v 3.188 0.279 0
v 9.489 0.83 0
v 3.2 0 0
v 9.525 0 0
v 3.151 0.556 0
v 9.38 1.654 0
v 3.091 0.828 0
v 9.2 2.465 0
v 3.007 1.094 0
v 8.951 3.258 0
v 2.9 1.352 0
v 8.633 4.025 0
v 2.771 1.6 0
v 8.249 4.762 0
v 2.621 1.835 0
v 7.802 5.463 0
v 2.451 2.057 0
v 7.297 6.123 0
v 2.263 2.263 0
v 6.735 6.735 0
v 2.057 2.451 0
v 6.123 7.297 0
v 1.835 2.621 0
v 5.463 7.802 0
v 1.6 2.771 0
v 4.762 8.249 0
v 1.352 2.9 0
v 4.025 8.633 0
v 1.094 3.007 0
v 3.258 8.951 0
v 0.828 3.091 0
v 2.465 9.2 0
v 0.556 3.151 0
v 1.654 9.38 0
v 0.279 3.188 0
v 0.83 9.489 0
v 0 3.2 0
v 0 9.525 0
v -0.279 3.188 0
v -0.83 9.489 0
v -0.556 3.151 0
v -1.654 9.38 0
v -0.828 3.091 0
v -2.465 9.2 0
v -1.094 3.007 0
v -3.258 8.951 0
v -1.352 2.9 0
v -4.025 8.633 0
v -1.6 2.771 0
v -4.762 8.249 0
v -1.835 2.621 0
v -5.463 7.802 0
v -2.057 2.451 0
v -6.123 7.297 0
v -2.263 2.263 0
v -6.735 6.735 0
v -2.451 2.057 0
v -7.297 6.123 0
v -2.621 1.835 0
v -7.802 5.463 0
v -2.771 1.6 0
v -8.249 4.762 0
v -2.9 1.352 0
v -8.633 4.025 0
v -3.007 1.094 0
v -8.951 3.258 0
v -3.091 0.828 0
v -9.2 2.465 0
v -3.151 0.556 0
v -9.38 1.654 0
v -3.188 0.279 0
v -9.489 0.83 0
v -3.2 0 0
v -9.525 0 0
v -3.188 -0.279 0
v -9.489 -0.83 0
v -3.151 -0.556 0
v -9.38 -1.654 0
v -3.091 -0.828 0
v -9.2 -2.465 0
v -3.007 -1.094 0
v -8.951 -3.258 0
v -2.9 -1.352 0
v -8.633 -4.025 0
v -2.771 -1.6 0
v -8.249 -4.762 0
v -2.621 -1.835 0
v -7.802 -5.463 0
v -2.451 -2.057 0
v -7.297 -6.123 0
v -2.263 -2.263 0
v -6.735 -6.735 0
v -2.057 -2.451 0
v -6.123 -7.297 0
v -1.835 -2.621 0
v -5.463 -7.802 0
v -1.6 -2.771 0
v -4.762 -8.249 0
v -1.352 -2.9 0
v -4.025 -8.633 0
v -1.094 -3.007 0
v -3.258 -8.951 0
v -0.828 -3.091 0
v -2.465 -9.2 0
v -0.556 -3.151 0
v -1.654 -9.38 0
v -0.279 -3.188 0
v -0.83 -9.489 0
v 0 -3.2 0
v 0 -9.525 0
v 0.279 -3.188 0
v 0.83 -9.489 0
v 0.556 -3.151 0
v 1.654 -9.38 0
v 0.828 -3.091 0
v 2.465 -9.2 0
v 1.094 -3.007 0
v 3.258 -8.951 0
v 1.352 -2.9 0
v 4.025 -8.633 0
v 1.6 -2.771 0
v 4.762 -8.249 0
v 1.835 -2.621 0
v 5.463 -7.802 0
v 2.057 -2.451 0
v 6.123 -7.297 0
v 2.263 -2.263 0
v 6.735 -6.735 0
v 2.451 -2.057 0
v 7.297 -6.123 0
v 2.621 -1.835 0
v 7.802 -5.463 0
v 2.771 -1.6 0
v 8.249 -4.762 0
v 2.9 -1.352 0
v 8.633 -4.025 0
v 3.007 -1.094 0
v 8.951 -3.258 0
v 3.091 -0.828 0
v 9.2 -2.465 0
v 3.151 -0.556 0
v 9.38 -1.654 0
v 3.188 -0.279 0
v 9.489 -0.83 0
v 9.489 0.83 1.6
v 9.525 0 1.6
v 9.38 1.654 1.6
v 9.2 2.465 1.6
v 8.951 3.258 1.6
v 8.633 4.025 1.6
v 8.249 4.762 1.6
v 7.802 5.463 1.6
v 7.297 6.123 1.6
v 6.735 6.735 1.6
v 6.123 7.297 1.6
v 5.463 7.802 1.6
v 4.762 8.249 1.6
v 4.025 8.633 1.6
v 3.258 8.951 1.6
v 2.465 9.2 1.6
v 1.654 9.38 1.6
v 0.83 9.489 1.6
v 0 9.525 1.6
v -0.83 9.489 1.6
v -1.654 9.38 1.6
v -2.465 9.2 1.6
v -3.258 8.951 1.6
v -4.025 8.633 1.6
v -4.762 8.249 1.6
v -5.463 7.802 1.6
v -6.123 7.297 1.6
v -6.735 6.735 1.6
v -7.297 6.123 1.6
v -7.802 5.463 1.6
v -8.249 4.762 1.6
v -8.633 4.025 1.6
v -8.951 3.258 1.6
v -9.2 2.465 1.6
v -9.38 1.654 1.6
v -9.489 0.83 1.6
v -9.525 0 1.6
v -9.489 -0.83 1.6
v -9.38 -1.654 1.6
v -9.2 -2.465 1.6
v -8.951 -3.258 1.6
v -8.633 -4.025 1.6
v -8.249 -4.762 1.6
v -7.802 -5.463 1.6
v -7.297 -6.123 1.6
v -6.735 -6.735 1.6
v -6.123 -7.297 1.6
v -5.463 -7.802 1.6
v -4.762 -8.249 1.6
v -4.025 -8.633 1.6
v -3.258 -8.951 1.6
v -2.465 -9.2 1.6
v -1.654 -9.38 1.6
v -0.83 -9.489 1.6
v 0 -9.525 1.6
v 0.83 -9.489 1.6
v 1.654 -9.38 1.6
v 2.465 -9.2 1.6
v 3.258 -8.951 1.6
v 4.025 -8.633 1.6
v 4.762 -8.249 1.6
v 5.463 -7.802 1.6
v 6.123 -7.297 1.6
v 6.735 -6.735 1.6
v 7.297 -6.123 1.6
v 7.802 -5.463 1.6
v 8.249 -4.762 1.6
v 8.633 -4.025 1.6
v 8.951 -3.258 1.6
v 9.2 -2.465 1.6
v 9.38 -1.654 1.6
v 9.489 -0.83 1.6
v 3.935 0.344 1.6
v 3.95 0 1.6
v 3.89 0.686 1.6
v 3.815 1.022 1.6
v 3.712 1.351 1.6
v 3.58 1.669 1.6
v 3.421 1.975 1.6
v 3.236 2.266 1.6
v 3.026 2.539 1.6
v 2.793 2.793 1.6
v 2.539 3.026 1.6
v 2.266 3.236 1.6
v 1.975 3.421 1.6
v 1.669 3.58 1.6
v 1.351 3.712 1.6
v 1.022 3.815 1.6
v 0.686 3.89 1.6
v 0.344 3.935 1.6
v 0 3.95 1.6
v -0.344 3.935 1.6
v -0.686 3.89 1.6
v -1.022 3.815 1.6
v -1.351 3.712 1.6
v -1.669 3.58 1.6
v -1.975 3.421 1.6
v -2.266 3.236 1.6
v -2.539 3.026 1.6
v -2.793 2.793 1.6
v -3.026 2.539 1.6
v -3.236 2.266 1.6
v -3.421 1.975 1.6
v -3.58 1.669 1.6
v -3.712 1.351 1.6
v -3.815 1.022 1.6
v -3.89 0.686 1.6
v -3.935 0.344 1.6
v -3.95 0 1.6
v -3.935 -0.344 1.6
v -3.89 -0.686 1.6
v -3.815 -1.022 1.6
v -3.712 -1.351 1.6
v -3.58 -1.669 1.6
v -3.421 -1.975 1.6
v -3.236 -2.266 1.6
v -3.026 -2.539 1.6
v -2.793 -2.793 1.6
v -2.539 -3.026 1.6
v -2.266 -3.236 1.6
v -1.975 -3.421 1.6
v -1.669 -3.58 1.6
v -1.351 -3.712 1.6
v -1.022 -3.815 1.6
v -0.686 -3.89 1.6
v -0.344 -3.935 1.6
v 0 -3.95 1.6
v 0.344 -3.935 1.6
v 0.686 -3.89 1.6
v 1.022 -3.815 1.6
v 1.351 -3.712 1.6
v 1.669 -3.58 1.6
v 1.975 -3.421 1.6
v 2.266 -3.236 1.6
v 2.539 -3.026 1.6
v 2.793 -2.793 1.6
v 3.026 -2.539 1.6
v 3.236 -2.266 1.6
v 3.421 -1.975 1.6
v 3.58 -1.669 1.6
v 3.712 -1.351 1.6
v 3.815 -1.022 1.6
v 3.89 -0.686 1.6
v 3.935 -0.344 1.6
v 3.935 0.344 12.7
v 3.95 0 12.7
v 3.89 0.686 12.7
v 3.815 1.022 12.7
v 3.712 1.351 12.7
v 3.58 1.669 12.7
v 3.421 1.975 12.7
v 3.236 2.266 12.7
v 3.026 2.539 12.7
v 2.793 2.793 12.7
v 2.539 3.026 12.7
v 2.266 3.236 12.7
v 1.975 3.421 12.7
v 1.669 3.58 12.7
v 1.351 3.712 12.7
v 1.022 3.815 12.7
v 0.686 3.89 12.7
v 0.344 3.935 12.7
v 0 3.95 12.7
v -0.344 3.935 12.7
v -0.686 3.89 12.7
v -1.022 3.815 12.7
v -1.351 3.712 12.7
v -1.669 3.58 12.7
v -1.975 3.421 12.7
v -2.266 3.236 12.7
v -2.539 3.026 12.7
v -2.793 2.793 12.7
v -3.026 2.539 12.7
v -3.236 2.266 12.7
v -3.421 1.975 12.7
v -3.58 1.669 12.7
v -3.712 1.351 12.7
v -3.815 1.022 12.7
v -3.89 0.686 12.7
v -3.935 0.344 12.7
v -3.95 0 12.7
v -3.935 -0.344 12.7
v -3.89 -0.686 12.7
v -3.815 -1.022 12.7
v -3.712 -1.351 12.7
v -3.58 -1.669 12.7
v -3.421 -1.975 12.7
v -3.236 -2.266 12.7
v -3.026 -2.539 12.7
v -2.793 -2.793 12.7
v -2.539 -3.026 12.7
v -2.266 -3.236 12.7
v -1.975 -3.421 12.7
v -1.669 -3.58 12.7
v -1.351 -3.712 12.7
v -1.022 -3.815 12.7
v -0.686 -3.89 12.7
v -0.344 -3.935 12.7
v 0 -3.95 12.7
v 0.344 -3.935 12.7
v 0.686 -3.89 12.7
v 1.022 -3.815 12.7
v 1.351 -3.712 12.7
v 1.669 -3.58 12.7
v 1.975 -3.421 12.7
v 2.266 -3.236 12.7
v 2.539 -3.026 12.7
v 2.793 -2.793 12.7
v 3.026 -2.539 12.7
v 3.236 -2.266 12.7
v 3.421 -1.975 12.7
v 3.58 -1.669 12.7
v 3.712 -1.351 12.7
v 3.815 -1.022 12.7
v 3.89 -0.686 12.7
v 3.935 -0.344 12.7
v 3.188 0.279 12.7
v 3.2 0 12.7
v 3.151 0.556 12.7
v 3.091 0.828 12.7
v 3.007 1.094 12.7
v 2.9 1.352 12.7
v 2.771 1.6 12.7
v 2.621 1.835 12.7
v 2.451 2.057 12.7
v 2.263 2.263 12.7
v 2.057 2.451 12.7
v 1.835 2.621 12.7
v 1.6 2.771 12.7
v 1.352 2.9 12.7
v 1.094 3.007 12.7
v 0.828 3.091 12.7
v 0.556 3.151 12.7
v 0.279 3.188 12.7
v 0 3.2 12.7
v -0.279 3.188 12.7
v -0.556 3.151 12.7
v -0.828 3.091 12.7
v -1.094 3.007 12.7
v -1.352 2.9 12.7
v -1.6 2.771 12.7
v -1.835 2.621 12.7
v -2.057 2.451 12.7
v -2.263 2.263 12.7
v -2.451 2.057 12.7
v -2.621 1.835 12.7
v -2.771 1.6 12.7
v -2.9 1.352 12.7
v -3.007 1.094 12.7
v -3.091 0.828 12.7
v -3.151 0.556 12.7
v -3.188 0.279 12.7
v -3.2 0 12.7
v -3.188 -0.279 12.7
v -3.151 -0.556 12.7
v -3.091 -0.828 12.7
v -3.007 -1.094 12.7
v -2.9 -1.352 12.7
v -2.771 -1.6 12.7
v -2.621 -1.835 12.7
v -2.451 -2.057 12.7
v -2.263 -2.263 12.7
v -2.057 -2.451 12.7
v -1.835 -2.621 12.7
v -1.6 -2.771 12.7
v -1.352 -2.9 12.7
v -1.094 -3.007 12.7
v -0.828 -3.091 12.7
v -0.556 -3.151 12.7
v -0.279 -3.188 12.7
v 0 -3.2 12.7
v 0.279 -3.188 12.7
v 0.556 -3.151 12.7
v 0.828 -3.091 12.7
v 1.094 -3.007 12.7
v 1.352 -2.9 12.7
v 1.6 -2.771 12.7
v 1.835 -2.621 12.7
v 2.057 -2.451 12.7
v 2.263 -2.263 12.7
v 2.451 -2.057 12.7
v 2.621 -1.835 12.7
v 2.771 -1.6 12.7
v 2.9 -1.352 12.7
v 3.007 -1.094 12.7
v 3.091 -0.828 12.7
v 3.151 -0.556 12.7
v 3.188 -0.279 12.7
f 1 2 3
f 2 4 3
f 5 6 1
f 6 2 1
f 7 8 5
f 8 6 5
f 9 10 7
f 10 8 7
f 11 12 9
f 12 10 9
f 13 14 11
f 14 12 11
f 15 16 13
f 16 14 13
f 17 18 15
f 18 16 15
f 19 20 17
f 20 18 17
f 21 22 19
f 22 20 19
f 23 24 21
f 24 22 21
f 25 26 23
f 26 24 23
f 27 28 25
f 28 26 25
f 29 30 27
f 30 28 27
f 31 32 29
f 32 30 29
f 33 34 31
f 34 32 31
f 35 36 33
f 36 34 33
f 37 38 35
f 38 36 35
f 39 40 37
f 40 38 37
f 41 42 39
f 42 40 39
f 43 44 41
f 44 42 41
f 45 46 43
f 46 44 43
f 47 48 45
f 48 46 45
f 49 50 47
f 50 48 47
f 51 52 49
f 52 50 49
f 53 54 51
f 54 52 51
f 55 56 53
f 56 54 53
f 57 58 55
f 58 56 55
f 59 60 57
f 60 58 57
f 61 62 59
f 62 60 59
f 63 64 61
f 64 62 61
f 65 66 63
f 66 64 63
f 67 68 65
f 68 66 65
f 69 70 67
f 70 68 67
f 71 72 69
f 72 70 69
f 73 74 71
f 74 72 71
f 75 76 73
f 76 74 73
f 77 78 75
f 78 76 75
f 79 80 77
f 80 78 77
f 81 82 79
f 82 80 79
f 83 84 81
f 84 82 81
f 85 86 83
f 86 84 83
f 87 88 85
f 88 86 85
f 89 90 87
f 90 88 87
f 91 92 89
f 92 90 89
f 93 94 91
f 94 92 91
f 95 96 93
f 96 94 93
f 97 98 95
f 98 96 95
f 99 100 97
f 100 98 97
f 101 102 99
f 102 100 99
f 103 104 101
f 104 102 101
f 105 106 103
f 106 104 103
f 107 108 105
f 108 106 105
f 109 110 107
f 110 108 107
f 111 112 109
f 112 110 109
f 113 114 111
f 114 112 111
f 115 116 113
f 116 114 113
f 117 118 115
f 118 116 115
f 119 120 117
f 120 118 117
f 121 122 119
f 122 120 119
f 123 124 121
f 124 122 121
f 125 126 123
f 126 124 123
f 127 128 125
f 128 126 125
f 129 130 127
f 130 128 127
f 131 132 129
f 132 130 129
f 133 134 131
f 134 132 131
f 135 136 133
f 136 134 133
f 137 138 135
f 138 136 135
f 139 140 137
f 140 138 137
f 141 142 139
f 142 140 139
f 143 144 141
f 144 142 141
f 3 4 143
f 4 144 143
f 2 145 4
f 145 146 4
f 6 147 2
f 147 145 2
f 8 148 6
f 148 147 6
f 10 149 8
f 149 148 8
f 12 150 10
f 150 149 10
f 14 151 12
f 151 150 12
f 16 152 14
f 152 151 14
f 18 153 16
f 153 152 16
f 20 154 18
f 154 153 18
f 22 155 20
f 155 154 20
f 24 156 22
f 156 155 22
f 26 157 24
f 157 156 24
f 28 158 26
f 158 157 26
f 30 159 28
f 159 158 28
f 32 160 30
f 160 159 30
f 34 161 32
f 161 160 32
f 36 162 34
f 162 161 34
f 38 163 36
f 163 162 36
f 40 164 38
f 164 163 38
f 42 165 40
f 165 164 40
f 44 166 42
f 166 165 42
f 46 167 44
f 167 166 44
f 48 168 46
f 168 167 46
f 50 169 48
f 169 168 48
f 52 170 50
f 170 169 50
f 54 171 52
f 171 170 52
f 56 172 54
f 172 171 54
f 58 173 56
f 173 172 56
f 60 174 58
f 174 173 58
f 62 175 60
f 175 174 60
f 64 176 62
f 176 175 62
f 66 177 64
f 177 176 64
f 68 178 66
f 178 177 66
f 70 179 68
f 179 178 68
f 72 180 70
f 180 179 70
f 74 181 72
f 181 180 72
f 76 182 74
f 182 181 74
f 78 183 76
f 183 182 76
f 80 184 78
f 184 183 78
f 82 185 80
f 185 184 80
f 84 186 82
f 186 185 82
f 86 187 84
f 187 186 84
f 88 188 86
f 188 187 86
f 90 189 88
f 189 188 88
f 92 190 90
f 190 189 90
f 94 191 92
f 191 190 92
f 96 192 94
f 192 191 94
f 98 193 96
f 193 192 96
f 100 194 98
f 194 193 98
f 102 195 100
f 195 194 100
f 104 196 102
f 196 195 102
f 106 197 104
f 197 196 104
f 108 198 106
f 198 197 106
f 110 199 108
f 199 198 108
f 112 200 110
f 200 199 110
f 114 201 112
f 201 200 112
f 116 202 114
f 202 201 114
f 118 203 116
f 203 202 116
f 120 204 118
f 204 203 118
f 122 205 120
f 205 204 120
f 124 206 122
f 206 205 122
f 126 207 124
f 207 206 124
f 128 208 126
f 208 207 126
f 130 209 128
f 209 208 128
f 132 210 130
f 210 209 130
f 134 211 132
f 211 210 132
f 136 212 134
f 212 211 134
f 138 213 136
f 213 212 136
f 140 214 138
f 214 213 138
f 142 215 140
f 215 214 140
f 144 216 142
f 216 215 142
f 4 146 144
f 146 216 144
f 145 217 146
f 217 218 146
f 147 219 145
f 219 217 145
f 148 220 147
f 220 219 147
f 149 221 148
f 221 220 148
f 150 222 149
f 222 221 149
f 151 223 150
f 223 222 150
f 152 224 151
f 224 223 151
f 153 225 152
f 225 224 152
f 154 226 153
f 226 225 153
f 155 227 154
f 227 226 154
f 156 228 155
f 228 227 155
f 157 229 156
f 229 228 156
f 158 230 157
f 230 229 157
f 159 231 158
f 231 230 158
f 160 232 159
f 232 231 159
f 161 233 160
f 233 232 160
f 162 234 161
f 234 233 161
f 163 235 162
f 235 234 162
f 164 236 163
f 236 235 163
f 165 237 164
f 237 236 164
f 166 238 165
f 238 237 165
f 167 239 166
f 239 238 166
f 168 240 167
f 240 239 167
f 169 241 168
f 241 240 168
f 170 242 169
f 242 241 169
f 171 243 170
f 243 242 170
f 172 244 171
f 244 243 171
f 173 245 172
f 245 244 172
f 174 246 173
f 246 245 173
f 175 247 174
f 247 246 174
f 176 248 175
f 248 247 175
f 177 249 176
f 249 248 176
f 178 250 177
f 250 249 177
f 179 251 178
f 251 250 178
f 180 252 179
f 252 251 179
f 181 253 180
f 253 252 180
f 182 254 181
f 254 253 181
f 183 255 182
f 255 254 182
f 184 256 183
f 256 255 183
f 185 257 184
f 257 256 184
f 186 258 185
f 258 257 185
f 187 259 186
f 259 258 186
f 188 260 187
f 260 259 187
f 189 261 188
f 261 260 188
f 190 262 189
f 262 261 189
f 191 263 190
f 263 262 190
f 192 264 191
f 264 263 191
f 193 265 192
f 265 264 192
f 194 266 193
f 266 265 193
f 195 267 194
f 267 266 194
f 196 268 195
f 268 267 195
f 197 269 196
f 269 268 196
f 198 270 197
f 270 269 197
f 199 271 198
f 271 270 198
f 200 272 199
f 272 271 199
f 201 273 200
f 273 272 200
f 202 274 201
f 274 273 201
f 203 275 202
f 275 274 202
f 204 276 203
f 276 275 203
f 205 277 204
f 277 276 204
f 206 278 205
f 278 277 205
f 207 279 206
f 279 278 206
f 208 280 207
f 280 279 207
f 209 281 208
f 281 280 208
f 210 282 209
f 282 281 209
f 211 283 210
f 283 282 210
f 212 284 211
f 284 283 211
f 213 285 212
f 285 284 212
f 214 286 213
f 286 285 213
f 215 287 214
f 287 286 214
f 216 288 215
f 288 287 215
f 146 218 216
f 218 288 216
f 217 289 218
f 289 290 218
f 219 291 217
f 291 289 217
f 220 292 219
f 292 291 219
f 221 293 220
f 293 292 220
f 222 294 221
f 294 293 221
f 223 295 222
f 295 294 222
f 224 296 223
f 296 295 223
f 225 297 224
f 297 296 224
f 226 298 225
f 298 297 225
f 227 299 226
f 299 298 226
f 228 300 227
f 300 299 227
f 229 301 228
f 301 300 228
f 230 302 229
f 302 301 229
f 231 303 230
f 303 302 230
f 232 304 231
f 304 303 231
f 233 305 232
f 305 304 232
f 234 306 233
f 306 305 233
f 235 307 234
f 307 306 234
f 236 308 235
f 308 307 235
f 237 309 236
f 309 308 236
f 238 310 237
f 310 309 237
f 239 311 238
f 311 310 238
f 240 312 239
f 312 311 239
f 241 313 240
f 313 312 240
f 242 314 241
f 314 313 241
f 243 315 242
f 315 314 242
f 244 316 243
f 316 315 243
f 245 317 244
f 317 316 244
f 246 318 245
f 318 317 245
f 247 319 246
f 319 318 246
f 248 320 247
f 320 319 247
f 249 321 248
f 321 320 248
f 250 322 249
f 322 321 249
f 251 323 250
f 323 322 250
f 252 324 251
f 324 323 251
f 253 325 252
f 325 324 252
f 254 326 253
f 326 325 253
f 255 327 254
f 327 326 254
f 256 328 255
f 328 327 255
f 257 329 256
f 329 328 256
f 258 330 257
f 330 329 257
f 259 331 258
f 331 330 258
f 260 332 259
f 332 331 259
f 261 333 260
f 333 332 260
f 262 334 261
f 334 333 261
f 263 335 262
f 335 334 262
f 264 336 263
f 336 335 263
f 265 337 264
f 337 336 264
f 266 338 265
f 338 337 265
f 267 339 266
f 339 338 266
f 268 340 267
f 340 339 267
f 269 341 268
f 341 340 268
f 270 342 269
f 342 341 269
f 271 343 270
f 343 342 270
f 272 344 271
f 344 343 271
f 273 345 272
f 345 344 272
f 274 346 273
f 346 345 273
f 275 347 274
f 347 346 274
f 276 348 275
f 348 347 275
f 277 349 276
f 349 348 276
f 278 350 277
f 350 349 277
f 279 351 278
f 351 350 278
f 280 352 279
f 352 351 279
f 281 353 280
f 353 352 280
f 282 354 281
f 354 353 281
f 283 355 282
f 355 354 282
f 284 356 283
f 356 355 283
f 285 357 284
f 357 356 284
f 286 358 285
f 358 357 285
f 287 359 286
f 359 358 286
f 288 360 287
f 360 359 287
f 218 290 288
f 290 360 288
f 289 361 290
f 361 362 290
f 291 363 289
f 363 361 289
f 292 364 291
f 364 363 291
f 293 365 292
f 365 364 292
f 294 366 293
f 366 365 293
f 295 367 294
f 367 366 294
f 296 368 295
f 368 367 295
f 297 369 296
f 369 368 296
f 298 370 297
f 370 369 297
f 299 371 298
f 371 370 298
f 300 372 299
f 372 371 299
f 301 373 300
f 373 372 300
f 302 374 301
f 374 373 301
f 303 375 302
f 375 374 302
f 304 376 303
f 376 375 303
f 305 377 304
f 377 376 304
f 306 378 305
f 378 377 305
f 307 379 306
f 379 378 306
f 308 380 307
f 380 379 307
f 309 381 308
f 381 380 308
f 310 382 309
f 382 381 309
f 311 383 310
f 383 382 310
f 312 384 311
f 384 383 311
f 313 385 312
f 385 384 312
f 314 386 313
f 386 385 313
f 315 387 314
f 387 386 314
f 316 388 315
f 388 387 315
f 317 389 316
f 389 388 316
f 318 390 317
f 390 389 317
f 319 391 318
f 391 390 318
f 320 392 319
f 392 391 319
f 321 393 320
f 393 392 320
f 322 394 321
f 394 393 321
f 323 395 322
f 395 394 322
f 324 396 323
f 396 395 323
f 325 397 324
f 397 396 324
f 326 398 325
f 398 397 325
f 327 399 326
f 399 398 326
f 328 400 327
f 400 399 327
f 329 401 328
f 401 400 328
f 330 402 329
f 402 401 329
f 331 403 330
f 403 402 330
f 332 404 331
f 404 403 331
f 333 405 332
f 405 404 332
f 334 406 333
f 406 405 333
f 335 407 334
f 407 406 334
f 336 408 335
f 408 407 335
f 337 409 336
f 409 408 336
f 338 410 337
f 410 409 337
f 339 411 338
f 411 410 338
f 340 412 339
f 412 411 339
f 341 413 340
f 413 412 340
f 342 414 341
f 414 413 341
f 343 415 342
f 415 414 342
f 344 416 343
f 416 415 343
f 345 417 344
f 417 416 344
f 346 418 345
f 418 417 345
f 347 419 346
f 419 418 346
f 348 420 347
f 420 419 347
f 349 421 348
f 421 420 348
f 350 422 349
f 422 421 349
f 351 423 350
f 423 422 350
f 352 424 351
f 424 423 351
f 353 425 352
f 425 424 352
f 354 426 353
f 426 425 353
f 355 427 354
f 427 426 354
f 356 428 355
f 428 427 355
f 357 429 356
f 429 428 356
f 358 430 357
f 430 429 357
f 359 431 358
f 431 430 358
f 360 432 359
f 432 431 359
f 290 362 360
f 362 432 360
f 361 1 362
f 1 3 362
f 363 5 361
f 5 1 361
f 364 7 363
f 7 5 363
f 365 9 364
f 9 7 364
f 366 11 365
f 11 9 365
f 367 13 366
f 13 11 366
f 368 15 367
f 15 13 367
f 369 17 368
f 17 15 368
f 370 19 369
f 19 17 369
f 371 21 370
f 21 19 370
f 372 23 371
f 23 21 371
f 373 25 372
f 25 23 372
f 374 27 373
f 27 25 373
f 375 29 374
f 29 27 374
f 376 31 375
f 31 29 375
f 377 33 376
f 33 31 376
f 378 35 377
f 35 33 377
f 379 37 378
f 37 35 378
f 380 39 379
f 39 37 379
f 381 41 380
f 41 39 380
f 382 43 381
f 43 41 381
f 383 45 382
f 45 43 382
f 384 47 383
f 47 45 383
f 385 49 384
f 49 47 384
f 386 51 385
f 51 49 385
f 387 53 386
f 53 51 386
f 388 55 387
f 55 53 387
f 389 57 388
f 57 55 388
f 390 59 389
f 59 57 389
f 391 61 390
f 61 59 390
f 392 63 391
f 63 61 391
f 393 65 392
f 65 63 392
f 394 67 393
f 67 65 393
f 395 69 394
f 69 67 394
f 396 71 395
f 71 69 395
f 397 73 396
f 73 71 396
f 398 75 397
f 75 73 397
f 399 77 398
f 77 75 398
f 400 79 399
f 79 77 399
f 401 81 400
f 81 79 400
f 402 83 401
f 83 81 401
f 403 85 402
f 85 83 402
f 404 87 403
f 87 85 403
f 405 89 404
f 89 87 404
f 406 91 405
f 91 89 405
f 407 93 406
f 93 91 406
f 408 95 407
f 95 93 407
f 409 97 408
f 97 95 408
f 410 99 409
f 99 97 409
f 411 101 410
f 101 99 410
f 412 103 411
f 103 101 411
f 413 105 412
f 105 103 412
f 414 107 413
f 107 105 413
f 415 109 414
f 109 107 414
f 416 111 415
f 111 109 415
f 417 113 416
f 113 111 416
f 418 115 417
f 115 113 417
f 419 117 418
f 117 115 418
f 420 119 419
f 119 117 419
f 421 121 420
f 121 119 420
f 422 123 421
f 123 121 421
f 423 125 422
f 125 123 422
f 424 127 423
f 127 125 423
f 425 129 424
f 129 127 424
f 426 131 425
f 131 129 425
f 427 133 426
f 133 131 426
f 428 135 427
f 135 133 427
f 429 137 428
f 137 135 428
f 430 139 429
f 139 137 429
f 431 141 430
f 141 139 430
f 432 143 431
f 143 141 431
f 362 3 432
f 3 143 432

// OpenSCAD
// file: ../lib/TOGMod1Constructors.scad
// TOGMod1Constructors-v1.7
// 
// Functions to construct objects understood by TOGMod1
// 
// v1.1:
// - Add togmod1_make_rounded_rect
// v1.2:
// - togmod1_make_rounded_rect can make ovals
// v1.3:
// - togmod1_circle_points, to just get the points of a circle
// - if pos parameter to circle function has a third element,
//   returned vertexes will include it as the z component;
// v1.3.1
// - Some assertions
// v1.4:
// - Refactor togmod1_rounded_rect_points and togmod1_circle_points
//   to use togmod1__make_nd_vector_adder for adapting to whatever
//   `pos` parameter is.
// v1.5:
// - togmod_rounded_rect_points will not simplify completely rounded sides
//   (where length of side is exactly twice the rounding radius)
//   unless simplify_rounded_sides=true
//   - This makes it more useful for polyhedron generation,
//     where radius varies, but number of points must remain constant.
// v1.6:
// - togmod1_make_rect makes a simple rectangle
// - togmod1_make_rounded_rect will defer to togmod1_make_rect when r=0
// v1.7:
// - togmod1_make_circle will return empty shape (["union"]) when d=0

use <./TOGArrayLib1.scad>

function togmod1__make_nd_vector_adder(origin=[0,0]) =
	let(origin_is_zero = tal1_reduce(true, origin, function(prev,item) prev && item == 0))
	origin_is_zero ? (function(vec) len(vec) >= len(origin) ? vec : tal1_replace_at(origin, 0, vec)) :
	function(vec) [
		for(i=[0:1:max(len(origin),len(vec))-1]) (len(vec) > i ? vec[i] : 0) + (len(origin) > i ? origin[i] : 0),
	];

assert([1,2,3] == togmod1__make_nd_vector_adder()([1,2,3]));
echo(togmod1__make_nd_vector_adder([0,0,3])([1,2]));
assert([1,2,3] == togmod1__make_nd_vector_adder([0,0,3])([1,2]));


function togmod1_make_cuboid(size) =
	assert(is_list(size))
	assert(len(size) >= 3)
	assert(is_num(size[0]))
	assert(is_num(size[1]))
	assert(is_num(size[2]))
	["polyhedron-vf", [
		[-size[0]/2, -size[1]/2, -size[2]/2],
		[+size[0]/2, -size[1]/2, -size[2]/2],
		[-size[0]/2, +size[1]/2, -size[2]/2],
		[+size[0]/2, +size[1]/2, -size[2]/2],
		[-size[0]/2, -size[1]/2, +size[2]/2],
		[+size[0]/2, -size[1]/2, +size[2]/2],
		[-size[0]/2, +size[1]/2, +size[2]/2],
		[+size[0]/2, +size[1]/2, +size[2]/2]
	], [
		[0,1,3,2],[0,4,5,1],[4,6,7,5],[3,7,6,2],[1,5,7,3],[6,4,0,2]
	]];

function togmod1_make_polygon(verts) =
	["polygon-vp", verts, [[for( i=[0:1:len(verts)-1] ) i%len(verts)]]];

function togmod1_rounded_rect_points(size, r, pos=[0,0], simplify_rounded_sides=false) =
	assert(is_list(size))
	assert(len(size) >= 2)
	let(radii = is_list(r) ? r : is_num(r) ? [r,r] : assert(false, "rounded_rect r(adius) should be list<num> or num"))
	let(rx = radii[0])
	let(ry = radii[1])
	assert(is_num(rx))
	assert(is_num(ry))
	assert(size[0] >= 2*rx, str("size[0] must be >= 2*r[0]; size[0] = ",size[0],", 2*r[0] = ",2*rx))
	assert(size[1] >= 2*ry, str("size[1] must be >= 2*r[1]; size[1] = ",size[1],", 2*r[1] = ",2*ry))
	let(quarterfn=max($fn/4, 1))
	let(qfnx = simplify_rounded_sides && size[0] == 2*rx ? quarterfn-1 : quarterfn)
	let(qfny = simplify_rounded_sides && size[1] == 2*ry ? quarterfn-1 : quarterfn)
	let(finalizepos = togmod1__make_nd_vector_adder(pos))
[
	for(a=[0 : 1 : qfnx]) let(ang=      a*90/quarterfn) finalizepos([ size[0]/2-rx + rx*cos(ang),  size[1]/2-ry + ry*sin(ang)]),
	for(a=[0 : 1 : qfny]) let(ang= 90 + a*90/quarterfn) finalizepos([-size[0]/2+rx + rx*cos(ang),  size[1]/2-ry + ry*sin(ang)]),
	for(a=[0 : 1 : qfnx]) let(ang=180 + a*90/quarterfn) finalizepos([-size[0]/2+rx + rx*cos(ang), -size[1]/2+ry + ry*sin(ang)]),
	for(a=[0 : 1 : qfny]) let(ang=270 + a*90/quarterfn) finalizepos([ size[0]/2-rx + rx*cos(ang), -size[1]/2+ry + ry*sin(ang)]),
];

function togmod1_make_rect(size) =
	togmod1_make_polygon([
		[-size[0]/2, -size[1]/2],
		[+size[0]/2, -size[1]/2],
		[+size[0]/2, +size[1]/2],
		[-size[0]/2, +size[1]/2],
	]);

function togmod1_make_rounded_rect(size, r) =
	r == 0 ? togmod1_make_rect(size) :
	togmod1_make_polygon(togmod1_rounded_rect_points(size,r,simplify_rounded_sides=true));

function togmod1_circle_points(r, pos=[0,0], d=undef) =
	assert( !is_undef(r) || !is_undef(d) )
	assert(!is_undef(pos[0]))
	assert(!is_undef(pos[1]))
	let(finalizepos = togmod1__make_nd_vector_adder(pos))
	let(r_ = !is_undef(r) ? r : d/2)
	let(fn = max($fn, 6))
	[for(i=[0 : 1 : fn-1]) finalizepos([r_*cos(i*360/fn), r_*sin(i*360/fn)])];

function togmod1_make_circle(r, pos=[0,0], d=undef) =
	r == 0 || d == 0 ? ["union"] :
	togmod1_make_polygon(togmod1_circle_points(r=r, pos=pos, d=d));

function togmod1_make_cylinder(d, zrange=[0,1], r=undef, pos=[0,0]) =
	assert( !is_undef(r) || !is_undef(d) )
	let( r_ = !is_undef(r) ? r : d/2 )
	// TODO: Make polyhedron directly
	["linear-extrude-zs", zrange, togmod1_make_circle(r=r_, pos=pos)];

function togmod1__is_range1d(range) = is_list(range) && len(range) == 2 && is_num(range[0]) && is_num(range[1]);

function togmod1_linear_extrude_z(range, shape) =
	assert(togmod1__is_range1d(range))
	["linear-extrude-zs", range, shape];
function togmod1_linear_extrude_x(range, shape) =
	assert(togmod1__is_range1d(range))
	["rotate", [90, 0, 90], togmod1_linear_extrude_z(range, shape)];
function togmod1_linear_extrude_y(range, shape) =
	assert(togmod1__is_range1d(range))
	["rotate", [90, 0, 180], togmod1_linear_extrude_z(range, shape)];
// file: ../lib/TOGArrayLib1.scad
// TOGArrayLib1.4
// 
// Functions for working with arrays.
// 
// v1.1:
// - tal1_reduce assert(is_list(items)) to prevent infinite recursion
//   when given undefined or other non-list values
// v1.1.1:
// - Fix tal1_uniq_remap_v2 to return "list-remap-result" as the
//   first element of the returned list
// v1.2:
// - Add tal1_replace_at function
// v1.3:
// - tal1_is_vec_of, tal1_is_vec_of_num
// v1.4:
// - tal1_assert_for_each, for when you want to assert something
//   about each of a list of items and get nice failure messages

/**
 * Make a list with the contents of list `a`,
 * but starting at offset `off`, replaced by the contents of list `b`.
 * len(result) = max(len(a), off+len(b))
 */
function tal1_replace_at(a, off, b, default_value=undef, default_value_function=undef) =
	assert(is_list(a))
	assert(is_list(b))
	let( _dvf = !is_undef(default_value_function) ? default_value_function : function(i) default_value )
[
	for( i=[0:1:min(off,len(a))-1] ) a[i],
	for( i=[len(a):1:off-1] ) _dvf(i),
	for( i=[off:1:off+len(b)-1] ) b[i-off],
	for( i=[off+len(b):1:len(a)-1] ) a[i],
];

// Simplest case
assert([] == tal1_replace_at([], 0, []));
// Second simplest cases
assert(["foo"] == tal1_replace_at(["foo"], 0, []));
assert(["foo"] == tal1_replace_at([], 0, ["foo"]));
// Replace one item
assert(["foo","quux","baz"] == tal1_replace_at(["foo","bar","baz"], 1, ["quux"]));
// Replace and extend
assert(["foo","quux","tuna","tina"] == tal1_replace_at(["foo","bar","baz"], 1, ["quux", "tuna", "tina"]));
// Add beyond end of `a`
assert(["foo","zzz","quux"] == tal1_replace_at(["foo"], 2, ["quux"], default_value="zzz"));
// Adding 'nothing' should still fill to that point with defaults
assert(["foo","zzz","zzz"] == tal1_replace_at(["foo"], 3, [], default_value="zzz"));


function tal1_reduce(start, items, func, offset=0) =
	assert(is_list(items))
	len(items) == offset ? start :
	tal1_reduce(func(start, items[offset]), items, func, offset+1);

function tal1_consecutive_duplicate_count(items) = tal1_reduce(
	[0, undef],
	items,
	function(z,item) [z[0] + (item == z[1] ? 1 : 0), item]
)[0];

assert(0 == tal1_consecutive_duplicate_count([]));
assert(0 == tal1_consecutive_duplicate_count([50]));
assert(1 == tal1_consecutive_duplicate_count([50,50]));
assert(0 == tal1_consecutive_duplicate_count([50,51,52,53]));
assert(1 == tal1_consecutive_duplicate_count([50,51,52,52]));
assert(3 == tal1_consecutive_duplicate_count([50,50,50,50]));

// Set test_size to arbirarily large values
// to ensure that OpenSCAD can handle heavy recursion
let(test_size=1000) assert(test_size/2 == tal1_consecutive_duplicate_count([for(i=[0:1:test_size-1]) floor(i/2)]));



function tal1_uniq_(items, off0, off1) =
	let(chunklen = off1-off0)
	chunklen == 0 ? [] :
	chunklen == 1 ? [items[off0]] :
	let(half=floor(chunklen/2))
	let(left  = tal1_uniq_(items, off0     , off0+half))
	let(right = tal1_uniq_(items, off0+half, off1     ))
	assert(len(left) > 0)
	assert(len(right) > 0)
	left[len(left)-1] == right[0] ? [each left, for(i=[1:1:len(right)-1]) right[i]] :
	[each left, each right];

/** Given a list of items, returns a new list with identical consecutive items merged */
function tal1_uniq(items) = tal1_uniq_(items, 0, len(items));

assert([] == tal1_uniq([]));
assert([123] == tal1_uniq([123]));
assert([55,0,1,2,3] == tal1_uniq([55,0,1,2,3]));
assert([55,0,1,2] == tal1_uniq([55,0,1,1,2]));
assert([55,0,1] == tal1_uniq([55,55,0,0,0,0,0,0,1,1,1,1]));
assert([55,0] == tal1_uniq([55,0,0,0,0,0,0,0]));



/**
 * Returns [new items, old index -> new index mapping].
 * No-op version.
 */
function tal1_uniq_remap_v1(items) =
	["list-remap-result", items, [for (vi=[0:1:len(items)-1]) vi]];

// [a, a, b, b, c, c]
//
// [a,    ...], []  -> [a],[0]
// [a, a, ...], [0] -> [a],[0,0]

assert([1,2,3] == [1,2,3]);

/**
 * Recursive version that will combine adjacent identical vertexes,
 * but will use the original items.
 */
function tal1_uniq_remap_v2(items, map=[]) =
	let(index = len(map))
	len(items) == index ? ["list-remap-result", items, map] :
	index == 0 ? tal1_uniq_remap_v2(items, [0]) :
	items[index] == items[map[index-1]] ? tal1_uniq_remap_v2(items, [for(vi=map) vi, map[index-1]]) :
	tal1_uniq_remap_v2(items, [for(vi=map) vi, index]);

assert(tal1_uniq_remap_v2([1,1,2,2,3,4]) == ["list-remap-result", [1,1,2,2,3,4], [0,0,2,2,4,5]]);


/**
 * Returns true if `vec` is a list of at least min_len items
 * and component_check(each item, even those beyond min_len) is true.
 */
function tal1_is_vec_of(vec, min_len=0, component_check=function(x) true) =
	assert(is_num(min_len) && min_len >= 0)
	assert(is_function(component_check))
	is_list(vec) && len(vec) >= min_len &&
	tal1_reduce(true, vec, function(prev,item) prev && component_check(item));

function tal1_is_vec_of_num(vec, min_len=0) = tal1_is_vec_of(vec, min_len, function(i) is_num(i));

assert( true == tal1_is_vec_of_num([1,2,3]));
assert( true == tal1_is_vec_of_num([]));
assert( true == tal1_is_vec_of_num([1,2,3], 3));
assert(false == tal1_is_vec_of_num([1,2], 3));
assert(false == tal1_is_vec_of_num([1,2,"spoon"], 3));
// Requirements are ambiguous when
// first min_len items are numbers, but there are non-numeric items afterwards,
// so let's error on the side of saying 'no, it's not a list of numbers';
// i.e. the item check and the min_len are independent.
assert(false == tal1_is_vec_of_num([1,2,3,"artichoke"], 3));


/**
 * Asserts that item_checker(each item in list, index of item)[0] is true.
 * Second element of item_checker return value is assertion message.
 * Returns the original list, in case that's useful to you.
 */
function tal1_assert_for_each(list, item_checker) =
	let( _ignored = [ for(i=[0:1:len(list)-1])
		let(q=item_checker(list[i],i))
		let(passed=is_bool(q) ? q : is_list(q) ? q[0] : assert(false, str(
			"tal1_assert_for_each: item_checker should return Bool|[Bool,String], but returned ",
			q, " for item at index ", i)))
		let(message=is_list(q) ? q[1] : undef)
		assert(passed, message)
		q
	])
	list;

// Callback can return a boolean...
assert([1,2,3] == tal1_assert_for_each([1,2,3], function(v,i) is_num(v)));
// ...or a [boolean, string]
assert([1,2,3] == tal1_assert_for_each([1,2,3], function(v,i) [is_num(v), "element be a num"]));
// file: ../lib/TOGMod1.scad
// TOGMod1
// OpenSCAD library for representing shapes
// 
// See also: Functional OpenSCAD (https://github.com/thehans/FunctionalOpenSCAD)

module togmod1_domodule(mod) {
	assert(is_list(mod));
	assert(len(mod) > 0);
	if( mod[0] == "polygon-vp" ) {
		// ["polygon-vp", vertexes, paths]
		polygon(points=mod[1], paths=mod[2]);
	} else if( mod[0] == "polyhedron-vf" ) {
		polyhedron(mod[1], faces=mod[2]);
	} else if( mod[0] == "scale" ) {
		assert(len(mod) == 3);
		scale(mod[1]) togmod1_domodule(mod[2]);
	} else if( mod[0] == "translate" ) {
		assert(len(mod) == 3);
		assert(is_list(mod[1]));
		for(c=mod[1]) assert(is_num(c), "translate component should be numeric");
		translate(mod[1]) togmod1_domodule(mod[2]);
	} else if( mod[0] == "rotate" ) {
		assert(len(mod) == 3);
		rotate(mod[1]) togmod1_domodule(mod[2]);
	} else if( mod[0] == "intersection" ) {
		intersection_for( i=[1:1:len(mod)-1] ) togmod1_domodule(mod[i]);
	} else if( mod[0] == "difference" ) {
		difference() {
			togmod1_domodule(mod[1]);
			for( i=[2:1:len(mod)-1] ) togmod1_domodule(mod[i]);
		}
	} else if( mod[0] == "union" ) {
		for( i=[1:1:len(mod)-1] ) togmod1_domodule(mod[i]);
	} else if( mod[0] == "hull" ) {
		hull() for( i=[1:1:len(mod)-1] ) togmod1_domodule(mod[i]);
	} else if( mod[0] == "offset-rs" ) {
		assert(len(mod) == 3);
		assert(is_num(mod[1]));
		assert(is_list(mod[2]));
		offset(mod[1]) togmod1_domodule(mod[2]);
	} else if( mod[0] == "linear-extrude-zs" ) {
		// ["linear-extrude-zs", [z0,z1], 2d_shape] // centered
		// ["linear-extrude-zs", height, 2d_shape]
		let( zrange = is_list(mod[1]) ? mod[1] : [-mod[1]/2, mod[1]/2] ) {
			translate([0,0,zrange[0]]) linear_extrude(zrange[1]-zrange[0]) togmod1_domodule(mod[2]);
		}
	} else if( mod[0] == "render" ) {
		render() togmod1_domodule(mod[1]);
	} else if( mod[0] == "minkowski" ) {
		minkowski() {
			togmod1_domodule(mod[1]);
			togmod1_domodule(mod[2]);
		}
	} else if( mod[0] == "x-debug" ) {
		# togmod1_domodule(mod[1]);
	} else {
		assert(false, str("Unrecognized shape: ", mod[0]));
	}
}
// main file
// Bushing1.1
// 
// v1.1:
// - Gracefully handle funky cases:
//   - flange_height <= 0
//   - flange_diameter <= barrel_diameter
//   - flange_height >= total_height

inner_diameter  =  6.4;  // 0.01
barrel_diameter =  7.9;  // 0.01
flange_diameter = 19.05; // 0.01
flange_height   =  1.6;  // 0.01
total_height    = 12.7;  // 0.01

$fn = 72;

use <../lib/TOGMod1.scad>
use <../lib/TOGPolyhedronLib1.scad>

mode =
	flange_height <= 0 || flange_diameter <= barrel_diameter ? "barrel" :
	flange_height >= total_height ? "flange" :
	"flange+barrel";

togmod1_domodule(tphl1_make_z_cylinder(zds=[
	[            0,  inner_diameter],
	each (
		mode == "barrel" ? [
			[           0, barrel_diameter],
			[total_height, barrel_diameter],
		] :
		mode == "flange" ? [
			[           0, flange_diameter],
			[total_height, flange_diameter],
		] : [
			[            0, flange_diameter],
			[flange_height, flange_diameter],
			[flange_height, barrel_diameter],
			[ total_height, barrel_diameter],
		]
	),
	[ total_height,  inner_diameter],
	[            0,  inner_diameter],
], cap_bottom=false, cap_top=false));
